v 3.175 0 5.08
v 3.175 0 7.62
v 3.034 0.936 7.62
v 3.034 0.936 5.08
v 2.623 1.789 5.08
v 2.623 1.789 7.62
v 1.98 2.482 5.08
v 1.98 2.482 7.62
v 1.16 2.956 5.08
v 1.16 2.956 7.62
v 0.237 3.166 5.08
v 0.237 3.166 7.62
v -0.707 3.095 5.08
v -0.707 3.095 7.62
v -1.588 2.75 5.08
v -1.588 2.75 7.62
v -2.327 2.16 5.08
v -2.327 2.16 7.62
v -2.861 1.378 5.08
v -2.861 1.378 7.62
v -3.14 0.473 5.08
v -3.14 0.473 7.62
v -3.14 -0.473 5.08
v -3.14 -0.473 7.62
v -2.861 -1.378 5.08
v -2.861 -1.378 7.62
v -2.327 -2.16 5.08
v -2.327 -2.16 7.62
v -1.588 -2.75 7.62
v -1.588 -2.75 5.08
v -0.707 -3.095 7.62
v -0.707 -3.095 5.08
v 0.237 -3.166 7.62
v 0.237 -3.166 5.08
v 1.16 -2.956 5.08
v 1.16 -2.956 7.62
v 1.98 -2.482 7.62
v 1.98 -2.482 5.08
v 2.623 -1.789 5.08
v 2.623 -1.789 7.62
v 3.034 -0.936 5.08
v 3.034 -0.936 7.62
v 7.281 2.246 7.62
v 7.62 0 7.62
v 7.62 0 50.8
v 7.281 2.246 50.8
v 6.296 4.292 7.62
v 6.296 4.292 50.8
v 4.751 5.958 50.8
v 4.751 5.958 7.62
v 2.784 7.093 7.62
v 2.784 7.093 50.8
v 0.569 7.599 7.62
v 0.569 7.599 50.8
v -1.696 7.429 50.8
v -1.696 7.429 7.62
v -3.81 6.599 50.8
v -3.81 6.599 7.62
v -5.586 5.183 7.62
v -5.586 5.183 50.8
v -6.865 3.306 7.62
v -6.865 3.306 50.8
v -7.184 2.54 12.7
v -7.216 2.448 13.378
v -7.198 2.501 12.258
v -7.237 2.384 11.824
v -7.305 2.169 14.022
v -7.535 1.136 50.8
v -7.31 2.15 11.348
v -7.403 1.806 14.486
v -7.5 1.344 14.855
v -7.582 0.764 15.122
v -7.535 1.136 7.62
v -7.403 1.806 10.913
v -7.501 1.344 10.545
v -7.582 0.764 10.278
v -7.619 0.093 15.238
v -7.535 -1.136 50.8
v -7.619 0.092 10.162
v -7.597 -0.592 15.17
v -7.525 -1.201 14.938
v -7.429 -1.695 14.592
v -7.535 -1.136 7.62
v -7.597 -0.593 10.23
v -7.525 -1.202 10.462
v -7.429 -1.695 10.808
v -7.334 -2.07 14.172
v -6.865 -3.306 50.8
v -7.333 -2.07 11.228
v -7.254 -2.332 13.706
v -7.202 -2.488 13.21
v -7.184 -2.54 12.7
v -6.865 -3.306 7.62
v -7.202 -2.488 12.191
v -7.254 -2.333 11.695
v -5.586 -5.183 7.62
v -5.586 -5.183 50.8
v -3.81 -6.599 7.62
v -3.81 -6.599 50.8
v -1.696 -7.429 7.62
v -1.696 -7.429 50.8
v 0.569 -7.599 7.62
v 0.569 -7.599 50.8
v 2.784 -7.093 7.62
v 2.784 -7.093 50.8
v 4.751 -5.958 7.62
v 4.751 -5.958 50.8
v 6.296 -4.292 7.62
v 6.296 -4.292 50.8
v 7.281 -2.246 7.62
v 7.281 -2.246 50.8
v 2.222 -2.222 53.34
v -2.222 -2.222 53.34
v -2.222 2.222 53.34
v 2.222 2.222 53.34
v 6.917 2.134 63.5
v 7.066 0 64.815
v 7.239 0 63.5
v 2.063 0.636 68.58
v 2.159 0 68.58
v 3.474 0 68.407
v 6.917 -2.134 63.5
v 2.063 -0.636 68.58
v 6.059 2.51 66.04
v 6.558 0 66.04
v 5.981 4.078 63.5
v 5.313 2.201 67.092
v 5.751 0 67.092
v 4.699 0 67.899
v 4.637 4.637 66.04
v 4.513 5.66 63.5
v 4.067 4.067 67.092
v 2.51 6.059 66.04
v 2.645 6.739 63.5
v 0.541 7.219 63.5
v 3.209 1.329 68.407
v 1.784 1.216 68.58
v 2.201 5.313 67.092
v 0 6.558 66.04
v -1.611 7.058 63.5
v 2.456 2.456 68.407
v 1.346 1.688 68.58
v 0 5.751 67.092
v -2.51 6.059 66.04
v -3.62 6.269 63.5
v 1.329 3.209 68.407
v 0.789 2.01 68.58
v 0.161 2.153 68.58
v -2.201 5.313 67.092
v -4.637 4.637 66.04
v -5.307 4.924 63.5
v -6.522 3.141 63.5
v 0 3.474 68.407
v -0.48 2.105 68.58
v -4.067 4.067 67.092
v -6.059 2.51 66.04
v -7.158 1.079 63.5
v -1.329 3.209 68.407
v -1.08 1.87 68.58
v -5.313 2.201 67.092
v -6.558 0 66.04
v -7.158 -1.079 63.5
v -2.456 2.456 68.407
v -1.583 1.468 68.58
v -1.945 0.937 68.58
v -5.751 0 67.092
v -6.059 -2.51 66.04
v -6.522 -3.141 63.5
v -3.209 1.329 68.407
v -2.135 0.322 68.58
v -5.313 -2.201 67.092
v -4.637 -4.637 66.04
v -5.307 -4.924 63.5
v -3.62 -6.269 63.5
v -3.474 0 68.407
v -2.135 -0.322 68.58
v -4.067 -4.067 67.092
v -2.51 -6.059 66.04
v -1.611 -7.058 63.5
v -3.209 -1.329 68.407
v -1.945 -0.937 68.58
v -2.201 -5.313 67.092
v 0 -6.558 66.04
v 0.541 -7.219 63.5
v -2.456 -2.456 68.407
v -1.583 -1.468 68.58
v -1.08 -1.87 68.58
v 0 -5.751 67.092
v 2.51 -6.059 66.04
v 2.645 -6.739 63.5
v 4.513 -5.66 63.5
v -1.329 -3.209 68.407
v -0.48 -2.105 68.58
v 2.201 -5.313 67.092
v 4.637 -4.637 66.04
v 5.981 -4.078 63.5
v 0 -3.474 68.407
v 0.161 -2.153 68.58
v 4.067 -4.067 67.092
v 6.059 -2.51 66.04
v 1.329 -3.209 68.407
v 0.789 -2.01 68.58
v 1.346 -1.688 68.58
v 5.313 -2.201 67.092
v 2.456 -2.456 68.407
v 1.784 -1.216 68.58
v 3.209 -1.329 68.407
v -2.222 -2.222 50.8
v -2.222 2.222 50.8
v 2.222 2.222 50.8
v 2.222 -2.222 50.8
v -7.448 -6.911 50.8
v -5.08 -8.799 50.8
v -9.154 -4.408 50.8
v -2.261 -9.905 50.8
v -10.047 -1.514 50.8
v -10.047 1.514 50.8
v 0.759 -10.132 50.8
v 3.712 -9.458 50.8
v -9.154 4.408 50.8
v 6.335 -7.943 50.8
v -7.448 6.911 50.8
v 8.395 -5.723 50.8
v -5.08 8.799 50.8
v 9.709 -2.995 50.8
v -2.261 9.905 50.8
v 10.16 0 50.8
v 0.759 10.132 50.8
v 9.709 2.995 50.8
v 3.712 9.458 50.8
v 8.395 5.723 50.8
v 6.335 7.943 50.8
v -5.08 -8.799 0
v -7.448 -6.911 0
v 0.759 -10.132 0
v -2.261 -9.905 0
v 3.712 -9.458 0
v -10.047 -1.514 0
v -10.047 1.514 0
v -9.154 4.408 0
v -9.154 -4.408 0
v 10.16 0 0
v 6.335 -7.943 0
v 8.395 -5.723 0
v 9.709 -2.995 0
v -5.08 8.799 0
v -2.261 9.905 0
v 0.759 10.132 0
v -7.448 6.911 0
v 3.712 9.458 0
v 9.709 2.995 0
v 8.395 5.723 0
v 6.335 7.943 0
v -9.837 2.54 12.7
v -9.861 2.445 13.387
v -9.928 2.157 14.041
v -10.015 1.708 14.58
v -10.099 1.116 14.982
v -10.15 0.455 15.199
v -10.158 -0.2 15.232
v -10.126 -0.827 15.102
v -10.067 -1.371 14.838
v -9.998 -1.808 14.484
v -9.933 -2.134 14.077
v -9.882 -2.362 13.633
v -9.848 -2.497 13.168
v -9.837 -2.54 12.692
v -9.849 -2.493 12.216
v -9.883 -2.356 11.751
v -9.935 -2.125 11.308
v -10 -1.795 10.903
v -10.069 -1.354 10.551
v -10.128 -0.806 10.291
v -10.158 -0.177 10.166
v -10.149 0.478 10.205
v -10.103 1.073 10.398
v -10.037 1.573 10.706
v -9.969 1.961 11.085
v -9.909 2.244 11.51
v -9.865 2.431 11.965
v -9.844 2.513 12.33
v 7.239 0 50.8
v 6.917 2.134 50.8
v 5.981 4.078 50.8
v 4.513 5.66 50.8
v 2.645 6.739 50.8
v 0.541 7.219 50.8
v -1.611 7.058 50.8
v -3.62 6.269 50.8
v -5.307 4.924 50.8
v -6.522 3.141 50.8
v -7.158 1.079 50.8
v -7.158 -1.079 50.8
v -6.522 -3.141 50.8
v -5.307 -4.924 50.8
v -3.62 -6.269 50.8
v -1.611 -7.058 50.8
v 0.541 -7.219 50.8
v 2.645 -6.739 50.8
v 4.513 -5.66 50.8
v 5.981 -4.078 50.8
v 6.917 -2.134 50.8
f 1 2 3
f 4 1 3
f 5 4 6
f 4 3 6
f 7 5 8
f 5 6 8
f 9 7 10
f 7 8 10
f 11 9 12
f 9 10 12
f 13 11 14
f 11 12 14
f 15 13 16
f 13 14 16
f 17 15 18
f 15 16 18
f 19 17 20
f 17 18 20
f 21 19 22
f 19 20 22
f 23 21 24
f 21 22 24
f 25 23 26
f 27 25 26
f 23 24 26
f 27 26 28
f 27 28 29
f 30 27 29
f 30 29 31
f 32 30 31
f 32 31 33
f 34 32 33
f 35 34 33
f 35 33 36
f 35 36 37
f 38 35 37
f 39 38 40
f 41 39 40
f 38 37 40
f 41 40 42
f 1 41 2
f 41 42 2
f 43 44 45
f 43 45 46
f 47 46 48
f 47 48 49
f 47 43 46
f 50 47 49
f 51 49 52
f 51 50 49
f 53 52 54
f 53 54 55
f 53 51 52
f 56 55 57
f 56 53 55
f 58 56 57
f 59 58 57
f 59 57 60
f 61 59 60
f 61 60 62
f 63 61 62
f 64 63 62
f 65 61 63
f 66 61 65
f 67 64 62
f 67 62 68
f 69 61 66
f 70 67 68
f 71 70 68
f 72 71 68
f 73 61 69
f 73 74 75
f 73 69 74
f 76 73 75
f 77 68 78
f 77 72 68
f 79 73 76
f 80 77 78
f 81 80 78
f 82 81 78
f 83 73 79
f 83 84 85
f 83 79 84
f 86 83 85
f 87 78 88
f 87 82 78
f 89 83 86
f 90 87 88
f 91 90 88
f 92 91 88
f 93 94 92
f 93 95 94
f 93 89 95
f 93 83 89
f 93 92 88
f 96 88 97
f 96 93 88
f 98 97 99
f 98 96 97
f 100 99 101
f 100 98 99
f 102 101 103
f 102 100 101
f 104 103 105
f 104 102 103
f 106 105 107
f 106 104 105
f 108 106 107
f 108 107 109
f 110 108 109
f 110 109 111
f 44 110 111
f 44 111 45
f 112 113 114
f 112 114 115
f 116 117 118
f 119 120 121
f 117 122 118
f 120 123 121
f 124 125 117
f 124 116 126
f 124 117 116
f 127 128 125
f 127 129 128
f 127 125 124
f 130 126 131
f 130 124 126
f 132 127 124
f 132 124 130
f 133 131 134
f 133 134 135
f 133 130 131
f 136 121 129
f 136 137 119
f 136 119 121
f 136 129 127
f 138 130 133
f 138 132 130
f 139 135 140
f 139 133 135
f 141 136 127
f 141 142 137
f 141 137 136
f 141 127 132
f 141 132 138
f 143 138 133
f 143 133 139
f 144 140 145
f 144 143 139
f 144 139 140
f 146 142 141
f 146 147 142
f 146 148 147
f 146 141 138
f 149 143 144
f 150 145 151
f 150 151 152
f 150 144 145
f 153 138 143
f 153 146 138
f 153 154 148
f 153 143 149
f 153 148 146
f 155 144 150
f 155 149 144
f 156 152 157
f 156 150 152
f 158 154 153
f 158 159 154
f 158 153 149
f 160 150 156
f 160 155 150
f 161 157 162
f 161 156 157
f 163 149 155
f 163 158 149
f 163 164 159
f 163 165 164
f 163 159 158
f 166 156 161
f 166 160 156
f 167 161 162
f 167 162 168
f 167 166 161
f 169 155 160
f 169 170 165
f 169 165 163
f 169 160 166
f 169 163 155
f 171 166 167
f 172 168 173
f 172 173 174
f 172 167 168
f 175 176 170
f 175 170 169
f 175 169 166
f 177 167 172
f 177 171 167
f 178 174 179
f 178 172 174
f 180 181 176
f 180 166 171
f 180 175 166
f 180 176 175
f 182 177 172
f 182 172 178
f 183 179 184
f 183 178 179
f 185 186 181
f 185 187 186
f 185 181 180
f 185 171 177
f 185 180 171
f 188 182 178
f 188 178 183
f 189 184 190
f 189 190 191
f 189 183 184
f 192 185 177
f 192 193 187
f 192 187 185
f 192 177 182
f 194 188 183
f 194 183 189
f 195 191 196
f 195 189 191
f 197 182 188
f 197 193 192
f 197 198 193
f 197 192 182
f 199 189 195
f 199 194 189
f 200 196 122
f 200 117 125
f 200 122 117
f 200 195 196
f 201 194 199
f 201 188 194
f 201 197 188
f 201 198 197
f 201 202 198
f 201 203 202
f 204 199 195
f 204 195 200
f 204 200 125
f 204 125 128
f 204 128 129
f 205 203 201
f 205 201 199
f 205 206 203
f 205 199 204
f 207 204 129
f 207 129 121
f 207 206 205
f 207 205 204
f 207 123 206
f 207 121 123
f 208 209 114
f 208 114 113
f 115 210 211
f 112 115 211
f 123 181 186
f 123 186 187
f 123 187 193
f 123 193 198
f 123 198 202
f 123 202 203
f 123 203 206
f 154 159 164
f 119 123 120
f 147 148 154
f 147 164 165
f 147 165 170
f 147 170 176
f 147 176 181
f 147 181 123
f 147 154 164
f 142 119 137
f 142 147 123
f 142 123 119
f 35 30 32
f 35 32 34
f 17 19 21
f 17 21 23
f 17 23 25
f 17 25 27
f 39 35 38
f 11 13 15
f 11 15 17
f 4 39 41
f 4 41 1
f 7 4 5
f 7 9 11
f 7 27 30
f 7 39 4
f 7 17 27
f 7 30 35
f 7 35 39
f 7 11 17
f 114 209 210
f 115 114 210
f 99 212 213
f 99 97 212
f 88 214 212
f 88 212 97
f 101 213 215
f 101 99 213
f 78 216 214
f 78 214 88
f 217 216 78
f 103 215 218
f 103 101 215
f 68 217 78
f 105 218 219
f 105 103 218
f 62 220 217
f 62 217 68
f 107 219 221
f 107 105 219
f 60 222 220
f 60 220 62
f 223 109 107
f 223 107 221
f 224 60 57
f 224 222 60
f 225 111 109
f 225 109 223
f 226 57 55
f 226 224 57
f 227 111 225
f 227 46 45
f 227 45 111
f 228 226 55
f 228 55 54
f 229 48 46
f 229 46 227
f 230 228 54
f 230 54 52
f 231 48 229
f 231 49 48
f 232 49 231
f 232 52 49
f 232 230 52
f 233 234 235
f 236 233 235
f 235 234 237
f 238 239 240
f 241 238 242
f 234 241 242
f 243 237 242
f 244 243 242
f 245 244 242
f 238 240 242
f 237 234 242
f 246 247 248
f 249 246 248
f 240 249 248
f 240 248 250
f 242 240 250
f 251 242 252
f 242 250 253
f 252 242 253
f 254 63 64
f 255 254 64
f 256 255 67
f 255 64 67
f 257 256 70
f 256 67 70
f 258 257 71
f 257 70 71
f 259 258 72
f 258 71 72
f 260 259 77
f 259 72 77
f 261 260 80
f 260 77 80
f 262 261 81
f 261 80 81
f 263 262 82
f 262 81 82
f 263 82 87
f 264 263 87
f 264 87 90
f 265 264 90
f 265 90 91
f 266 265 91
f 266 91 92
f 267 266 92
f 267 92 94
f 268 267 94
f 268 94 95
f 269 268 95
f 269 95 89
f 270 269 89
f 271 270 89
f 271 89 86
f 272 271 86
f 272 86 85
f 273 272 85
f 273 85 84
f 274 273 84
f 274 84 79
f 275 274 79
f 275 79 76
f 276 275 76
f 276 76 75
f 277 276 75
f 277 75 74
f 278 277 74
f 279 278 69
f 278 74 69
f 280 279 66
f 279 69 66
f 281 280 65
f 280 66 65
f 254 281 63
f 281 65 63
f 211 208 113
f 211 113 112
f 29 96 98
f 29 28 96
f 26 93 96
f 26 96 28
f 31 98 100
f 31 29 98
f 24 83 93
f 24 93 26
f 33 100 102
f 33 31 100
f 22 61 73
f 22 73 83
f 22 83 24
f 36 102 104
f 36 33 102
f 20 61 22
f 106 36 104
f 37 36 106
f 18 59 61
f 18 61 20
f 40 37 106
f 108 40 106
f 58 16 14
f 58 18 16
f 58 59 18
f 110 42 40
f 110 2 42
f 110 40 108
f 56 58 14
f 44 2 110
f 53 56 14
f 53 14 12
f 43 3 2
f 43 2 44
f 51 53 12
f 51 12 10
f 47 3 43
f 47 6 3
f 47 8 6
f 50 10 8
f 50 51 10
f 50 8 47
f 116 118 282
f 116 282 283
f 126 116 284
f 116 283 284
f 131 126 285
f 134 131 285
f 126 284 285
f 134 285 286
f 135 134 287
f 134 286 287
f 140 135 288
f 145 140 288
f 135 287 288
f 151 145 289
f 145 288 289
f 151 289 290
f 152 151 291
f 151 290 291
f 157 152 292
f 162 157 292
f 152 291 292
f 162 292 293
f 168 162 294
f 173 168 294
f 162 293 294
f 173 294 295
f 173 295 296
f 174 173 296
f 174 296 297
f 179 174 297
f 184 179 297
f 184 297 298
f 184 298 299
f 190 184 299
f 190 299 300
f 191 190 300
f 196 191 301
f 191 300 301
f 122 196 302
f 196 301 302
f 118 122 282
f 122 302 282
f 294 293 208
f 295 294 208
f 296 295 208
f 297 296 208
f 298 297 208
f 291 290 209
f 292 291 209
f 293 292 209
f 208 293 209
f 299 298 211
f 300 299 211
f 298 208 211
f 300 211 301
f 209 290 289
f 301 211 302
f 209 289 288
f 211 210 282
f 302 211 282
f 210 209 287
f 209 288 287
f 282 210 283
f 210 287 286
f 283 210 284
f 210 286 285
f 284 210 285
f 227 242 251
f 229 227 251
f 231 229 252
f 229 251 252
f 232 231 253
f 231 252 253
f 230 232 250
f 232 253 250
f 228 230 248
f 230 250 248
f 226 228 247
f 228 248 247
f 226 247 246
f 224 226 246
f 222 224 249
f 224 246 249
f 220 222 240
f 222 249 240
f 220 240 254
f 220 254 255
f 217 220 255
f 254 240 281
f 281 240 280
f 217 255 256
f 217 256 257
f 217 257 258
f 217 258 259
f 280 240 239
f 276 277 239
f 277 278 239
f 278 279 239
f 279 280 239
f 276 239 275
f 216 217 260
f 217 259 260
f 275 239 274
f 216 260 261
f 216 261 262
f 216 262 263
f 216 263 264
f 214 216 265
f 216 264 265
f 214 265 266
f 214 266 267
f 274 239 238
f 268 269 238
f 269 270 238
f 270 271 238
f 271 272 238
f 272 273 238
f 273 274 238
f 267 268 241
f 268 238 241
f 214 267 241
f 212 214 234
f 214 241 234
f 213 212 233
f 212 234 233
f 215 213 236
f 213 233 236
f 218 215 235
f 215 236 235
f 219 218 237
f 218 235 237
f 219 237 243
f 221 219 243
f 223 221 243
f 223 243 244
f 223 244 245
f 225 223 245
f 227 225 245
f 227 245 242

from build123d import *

# Parameters (mm, degrees)
F0_R      = 10.16
F1_DEPTH  = 7.62
F2_R      = 10.16
F2_R_2    = 7.62
F3_DEPTH  = 43.18
F4_R      = 3.175
F5_DEPTH  = 2.54
F6_R      = 7.239
F7_DEPTH  = 17.78
F8_R      = 5.08
F9_W      = 4.445
F9_H      = 4.445
F10_DEPTH = 2.54
F11_R     = 2.54
F12_DEPTH = 25.4


with BuildPart() as f1:
    # F0 (on Top) → F1 (new body)
    with BuildSketch(Plane.XY):
        Circle(F0_R)
    extrude(amount=F1_DEPTH)

    # F2 (on face) → F3 (join)
    with BuildSketch(Plane.XY.offset(7.62)):
        Circle(F2_R)
        Circle(F2_R_2, mode=Mode.SUBTRACT)
    extrude(amount=F3_DEPTH)

    # F4 (on face) → F5 (cut)
    with BuildSketch(Plane.XY.offset(7.62)):
        Circle(F4_R)
    extrude(amount=-F5_DEPTH, mode=Mode.SUBTRACT)

    # F11 (on Right) → F12 (cut)
    with BuildSketch(Plane.YZ):
        with Locations((0, 12.7)):
            Circle(F11_R)
    extrude(amount=-F12_DEPTH, mode=Mode.SUBTRACT)


with BuildPart() as f7:
    # F6 (on face) → F7 (new body)
    with BuildSketch(Plane.XY.offset(50.8)):
        Circle(F6_R)
    extrude(amount=F7_DEPTH)

    # F8
    f8_edges = [f7.edges().sort_by_distance(p)[0] for p in [
        (-7.239, 0, 68.58),
    ]]
    fillet(f8_edges, radius=F8_R)

    # F9 (on face) → F10 (cut)
    with BuildSketch(Plane(origin=(0, 0, 50.8), x_dir=(1, 0, 0), z_dir=(0, 0, -1))):
        Rectangle(F9_W, F9_H)
    extrude(amount=-F10_DEPTH, mode=Mode.SUBTRACT)


solid = Compound([f1.part, f7.part])
